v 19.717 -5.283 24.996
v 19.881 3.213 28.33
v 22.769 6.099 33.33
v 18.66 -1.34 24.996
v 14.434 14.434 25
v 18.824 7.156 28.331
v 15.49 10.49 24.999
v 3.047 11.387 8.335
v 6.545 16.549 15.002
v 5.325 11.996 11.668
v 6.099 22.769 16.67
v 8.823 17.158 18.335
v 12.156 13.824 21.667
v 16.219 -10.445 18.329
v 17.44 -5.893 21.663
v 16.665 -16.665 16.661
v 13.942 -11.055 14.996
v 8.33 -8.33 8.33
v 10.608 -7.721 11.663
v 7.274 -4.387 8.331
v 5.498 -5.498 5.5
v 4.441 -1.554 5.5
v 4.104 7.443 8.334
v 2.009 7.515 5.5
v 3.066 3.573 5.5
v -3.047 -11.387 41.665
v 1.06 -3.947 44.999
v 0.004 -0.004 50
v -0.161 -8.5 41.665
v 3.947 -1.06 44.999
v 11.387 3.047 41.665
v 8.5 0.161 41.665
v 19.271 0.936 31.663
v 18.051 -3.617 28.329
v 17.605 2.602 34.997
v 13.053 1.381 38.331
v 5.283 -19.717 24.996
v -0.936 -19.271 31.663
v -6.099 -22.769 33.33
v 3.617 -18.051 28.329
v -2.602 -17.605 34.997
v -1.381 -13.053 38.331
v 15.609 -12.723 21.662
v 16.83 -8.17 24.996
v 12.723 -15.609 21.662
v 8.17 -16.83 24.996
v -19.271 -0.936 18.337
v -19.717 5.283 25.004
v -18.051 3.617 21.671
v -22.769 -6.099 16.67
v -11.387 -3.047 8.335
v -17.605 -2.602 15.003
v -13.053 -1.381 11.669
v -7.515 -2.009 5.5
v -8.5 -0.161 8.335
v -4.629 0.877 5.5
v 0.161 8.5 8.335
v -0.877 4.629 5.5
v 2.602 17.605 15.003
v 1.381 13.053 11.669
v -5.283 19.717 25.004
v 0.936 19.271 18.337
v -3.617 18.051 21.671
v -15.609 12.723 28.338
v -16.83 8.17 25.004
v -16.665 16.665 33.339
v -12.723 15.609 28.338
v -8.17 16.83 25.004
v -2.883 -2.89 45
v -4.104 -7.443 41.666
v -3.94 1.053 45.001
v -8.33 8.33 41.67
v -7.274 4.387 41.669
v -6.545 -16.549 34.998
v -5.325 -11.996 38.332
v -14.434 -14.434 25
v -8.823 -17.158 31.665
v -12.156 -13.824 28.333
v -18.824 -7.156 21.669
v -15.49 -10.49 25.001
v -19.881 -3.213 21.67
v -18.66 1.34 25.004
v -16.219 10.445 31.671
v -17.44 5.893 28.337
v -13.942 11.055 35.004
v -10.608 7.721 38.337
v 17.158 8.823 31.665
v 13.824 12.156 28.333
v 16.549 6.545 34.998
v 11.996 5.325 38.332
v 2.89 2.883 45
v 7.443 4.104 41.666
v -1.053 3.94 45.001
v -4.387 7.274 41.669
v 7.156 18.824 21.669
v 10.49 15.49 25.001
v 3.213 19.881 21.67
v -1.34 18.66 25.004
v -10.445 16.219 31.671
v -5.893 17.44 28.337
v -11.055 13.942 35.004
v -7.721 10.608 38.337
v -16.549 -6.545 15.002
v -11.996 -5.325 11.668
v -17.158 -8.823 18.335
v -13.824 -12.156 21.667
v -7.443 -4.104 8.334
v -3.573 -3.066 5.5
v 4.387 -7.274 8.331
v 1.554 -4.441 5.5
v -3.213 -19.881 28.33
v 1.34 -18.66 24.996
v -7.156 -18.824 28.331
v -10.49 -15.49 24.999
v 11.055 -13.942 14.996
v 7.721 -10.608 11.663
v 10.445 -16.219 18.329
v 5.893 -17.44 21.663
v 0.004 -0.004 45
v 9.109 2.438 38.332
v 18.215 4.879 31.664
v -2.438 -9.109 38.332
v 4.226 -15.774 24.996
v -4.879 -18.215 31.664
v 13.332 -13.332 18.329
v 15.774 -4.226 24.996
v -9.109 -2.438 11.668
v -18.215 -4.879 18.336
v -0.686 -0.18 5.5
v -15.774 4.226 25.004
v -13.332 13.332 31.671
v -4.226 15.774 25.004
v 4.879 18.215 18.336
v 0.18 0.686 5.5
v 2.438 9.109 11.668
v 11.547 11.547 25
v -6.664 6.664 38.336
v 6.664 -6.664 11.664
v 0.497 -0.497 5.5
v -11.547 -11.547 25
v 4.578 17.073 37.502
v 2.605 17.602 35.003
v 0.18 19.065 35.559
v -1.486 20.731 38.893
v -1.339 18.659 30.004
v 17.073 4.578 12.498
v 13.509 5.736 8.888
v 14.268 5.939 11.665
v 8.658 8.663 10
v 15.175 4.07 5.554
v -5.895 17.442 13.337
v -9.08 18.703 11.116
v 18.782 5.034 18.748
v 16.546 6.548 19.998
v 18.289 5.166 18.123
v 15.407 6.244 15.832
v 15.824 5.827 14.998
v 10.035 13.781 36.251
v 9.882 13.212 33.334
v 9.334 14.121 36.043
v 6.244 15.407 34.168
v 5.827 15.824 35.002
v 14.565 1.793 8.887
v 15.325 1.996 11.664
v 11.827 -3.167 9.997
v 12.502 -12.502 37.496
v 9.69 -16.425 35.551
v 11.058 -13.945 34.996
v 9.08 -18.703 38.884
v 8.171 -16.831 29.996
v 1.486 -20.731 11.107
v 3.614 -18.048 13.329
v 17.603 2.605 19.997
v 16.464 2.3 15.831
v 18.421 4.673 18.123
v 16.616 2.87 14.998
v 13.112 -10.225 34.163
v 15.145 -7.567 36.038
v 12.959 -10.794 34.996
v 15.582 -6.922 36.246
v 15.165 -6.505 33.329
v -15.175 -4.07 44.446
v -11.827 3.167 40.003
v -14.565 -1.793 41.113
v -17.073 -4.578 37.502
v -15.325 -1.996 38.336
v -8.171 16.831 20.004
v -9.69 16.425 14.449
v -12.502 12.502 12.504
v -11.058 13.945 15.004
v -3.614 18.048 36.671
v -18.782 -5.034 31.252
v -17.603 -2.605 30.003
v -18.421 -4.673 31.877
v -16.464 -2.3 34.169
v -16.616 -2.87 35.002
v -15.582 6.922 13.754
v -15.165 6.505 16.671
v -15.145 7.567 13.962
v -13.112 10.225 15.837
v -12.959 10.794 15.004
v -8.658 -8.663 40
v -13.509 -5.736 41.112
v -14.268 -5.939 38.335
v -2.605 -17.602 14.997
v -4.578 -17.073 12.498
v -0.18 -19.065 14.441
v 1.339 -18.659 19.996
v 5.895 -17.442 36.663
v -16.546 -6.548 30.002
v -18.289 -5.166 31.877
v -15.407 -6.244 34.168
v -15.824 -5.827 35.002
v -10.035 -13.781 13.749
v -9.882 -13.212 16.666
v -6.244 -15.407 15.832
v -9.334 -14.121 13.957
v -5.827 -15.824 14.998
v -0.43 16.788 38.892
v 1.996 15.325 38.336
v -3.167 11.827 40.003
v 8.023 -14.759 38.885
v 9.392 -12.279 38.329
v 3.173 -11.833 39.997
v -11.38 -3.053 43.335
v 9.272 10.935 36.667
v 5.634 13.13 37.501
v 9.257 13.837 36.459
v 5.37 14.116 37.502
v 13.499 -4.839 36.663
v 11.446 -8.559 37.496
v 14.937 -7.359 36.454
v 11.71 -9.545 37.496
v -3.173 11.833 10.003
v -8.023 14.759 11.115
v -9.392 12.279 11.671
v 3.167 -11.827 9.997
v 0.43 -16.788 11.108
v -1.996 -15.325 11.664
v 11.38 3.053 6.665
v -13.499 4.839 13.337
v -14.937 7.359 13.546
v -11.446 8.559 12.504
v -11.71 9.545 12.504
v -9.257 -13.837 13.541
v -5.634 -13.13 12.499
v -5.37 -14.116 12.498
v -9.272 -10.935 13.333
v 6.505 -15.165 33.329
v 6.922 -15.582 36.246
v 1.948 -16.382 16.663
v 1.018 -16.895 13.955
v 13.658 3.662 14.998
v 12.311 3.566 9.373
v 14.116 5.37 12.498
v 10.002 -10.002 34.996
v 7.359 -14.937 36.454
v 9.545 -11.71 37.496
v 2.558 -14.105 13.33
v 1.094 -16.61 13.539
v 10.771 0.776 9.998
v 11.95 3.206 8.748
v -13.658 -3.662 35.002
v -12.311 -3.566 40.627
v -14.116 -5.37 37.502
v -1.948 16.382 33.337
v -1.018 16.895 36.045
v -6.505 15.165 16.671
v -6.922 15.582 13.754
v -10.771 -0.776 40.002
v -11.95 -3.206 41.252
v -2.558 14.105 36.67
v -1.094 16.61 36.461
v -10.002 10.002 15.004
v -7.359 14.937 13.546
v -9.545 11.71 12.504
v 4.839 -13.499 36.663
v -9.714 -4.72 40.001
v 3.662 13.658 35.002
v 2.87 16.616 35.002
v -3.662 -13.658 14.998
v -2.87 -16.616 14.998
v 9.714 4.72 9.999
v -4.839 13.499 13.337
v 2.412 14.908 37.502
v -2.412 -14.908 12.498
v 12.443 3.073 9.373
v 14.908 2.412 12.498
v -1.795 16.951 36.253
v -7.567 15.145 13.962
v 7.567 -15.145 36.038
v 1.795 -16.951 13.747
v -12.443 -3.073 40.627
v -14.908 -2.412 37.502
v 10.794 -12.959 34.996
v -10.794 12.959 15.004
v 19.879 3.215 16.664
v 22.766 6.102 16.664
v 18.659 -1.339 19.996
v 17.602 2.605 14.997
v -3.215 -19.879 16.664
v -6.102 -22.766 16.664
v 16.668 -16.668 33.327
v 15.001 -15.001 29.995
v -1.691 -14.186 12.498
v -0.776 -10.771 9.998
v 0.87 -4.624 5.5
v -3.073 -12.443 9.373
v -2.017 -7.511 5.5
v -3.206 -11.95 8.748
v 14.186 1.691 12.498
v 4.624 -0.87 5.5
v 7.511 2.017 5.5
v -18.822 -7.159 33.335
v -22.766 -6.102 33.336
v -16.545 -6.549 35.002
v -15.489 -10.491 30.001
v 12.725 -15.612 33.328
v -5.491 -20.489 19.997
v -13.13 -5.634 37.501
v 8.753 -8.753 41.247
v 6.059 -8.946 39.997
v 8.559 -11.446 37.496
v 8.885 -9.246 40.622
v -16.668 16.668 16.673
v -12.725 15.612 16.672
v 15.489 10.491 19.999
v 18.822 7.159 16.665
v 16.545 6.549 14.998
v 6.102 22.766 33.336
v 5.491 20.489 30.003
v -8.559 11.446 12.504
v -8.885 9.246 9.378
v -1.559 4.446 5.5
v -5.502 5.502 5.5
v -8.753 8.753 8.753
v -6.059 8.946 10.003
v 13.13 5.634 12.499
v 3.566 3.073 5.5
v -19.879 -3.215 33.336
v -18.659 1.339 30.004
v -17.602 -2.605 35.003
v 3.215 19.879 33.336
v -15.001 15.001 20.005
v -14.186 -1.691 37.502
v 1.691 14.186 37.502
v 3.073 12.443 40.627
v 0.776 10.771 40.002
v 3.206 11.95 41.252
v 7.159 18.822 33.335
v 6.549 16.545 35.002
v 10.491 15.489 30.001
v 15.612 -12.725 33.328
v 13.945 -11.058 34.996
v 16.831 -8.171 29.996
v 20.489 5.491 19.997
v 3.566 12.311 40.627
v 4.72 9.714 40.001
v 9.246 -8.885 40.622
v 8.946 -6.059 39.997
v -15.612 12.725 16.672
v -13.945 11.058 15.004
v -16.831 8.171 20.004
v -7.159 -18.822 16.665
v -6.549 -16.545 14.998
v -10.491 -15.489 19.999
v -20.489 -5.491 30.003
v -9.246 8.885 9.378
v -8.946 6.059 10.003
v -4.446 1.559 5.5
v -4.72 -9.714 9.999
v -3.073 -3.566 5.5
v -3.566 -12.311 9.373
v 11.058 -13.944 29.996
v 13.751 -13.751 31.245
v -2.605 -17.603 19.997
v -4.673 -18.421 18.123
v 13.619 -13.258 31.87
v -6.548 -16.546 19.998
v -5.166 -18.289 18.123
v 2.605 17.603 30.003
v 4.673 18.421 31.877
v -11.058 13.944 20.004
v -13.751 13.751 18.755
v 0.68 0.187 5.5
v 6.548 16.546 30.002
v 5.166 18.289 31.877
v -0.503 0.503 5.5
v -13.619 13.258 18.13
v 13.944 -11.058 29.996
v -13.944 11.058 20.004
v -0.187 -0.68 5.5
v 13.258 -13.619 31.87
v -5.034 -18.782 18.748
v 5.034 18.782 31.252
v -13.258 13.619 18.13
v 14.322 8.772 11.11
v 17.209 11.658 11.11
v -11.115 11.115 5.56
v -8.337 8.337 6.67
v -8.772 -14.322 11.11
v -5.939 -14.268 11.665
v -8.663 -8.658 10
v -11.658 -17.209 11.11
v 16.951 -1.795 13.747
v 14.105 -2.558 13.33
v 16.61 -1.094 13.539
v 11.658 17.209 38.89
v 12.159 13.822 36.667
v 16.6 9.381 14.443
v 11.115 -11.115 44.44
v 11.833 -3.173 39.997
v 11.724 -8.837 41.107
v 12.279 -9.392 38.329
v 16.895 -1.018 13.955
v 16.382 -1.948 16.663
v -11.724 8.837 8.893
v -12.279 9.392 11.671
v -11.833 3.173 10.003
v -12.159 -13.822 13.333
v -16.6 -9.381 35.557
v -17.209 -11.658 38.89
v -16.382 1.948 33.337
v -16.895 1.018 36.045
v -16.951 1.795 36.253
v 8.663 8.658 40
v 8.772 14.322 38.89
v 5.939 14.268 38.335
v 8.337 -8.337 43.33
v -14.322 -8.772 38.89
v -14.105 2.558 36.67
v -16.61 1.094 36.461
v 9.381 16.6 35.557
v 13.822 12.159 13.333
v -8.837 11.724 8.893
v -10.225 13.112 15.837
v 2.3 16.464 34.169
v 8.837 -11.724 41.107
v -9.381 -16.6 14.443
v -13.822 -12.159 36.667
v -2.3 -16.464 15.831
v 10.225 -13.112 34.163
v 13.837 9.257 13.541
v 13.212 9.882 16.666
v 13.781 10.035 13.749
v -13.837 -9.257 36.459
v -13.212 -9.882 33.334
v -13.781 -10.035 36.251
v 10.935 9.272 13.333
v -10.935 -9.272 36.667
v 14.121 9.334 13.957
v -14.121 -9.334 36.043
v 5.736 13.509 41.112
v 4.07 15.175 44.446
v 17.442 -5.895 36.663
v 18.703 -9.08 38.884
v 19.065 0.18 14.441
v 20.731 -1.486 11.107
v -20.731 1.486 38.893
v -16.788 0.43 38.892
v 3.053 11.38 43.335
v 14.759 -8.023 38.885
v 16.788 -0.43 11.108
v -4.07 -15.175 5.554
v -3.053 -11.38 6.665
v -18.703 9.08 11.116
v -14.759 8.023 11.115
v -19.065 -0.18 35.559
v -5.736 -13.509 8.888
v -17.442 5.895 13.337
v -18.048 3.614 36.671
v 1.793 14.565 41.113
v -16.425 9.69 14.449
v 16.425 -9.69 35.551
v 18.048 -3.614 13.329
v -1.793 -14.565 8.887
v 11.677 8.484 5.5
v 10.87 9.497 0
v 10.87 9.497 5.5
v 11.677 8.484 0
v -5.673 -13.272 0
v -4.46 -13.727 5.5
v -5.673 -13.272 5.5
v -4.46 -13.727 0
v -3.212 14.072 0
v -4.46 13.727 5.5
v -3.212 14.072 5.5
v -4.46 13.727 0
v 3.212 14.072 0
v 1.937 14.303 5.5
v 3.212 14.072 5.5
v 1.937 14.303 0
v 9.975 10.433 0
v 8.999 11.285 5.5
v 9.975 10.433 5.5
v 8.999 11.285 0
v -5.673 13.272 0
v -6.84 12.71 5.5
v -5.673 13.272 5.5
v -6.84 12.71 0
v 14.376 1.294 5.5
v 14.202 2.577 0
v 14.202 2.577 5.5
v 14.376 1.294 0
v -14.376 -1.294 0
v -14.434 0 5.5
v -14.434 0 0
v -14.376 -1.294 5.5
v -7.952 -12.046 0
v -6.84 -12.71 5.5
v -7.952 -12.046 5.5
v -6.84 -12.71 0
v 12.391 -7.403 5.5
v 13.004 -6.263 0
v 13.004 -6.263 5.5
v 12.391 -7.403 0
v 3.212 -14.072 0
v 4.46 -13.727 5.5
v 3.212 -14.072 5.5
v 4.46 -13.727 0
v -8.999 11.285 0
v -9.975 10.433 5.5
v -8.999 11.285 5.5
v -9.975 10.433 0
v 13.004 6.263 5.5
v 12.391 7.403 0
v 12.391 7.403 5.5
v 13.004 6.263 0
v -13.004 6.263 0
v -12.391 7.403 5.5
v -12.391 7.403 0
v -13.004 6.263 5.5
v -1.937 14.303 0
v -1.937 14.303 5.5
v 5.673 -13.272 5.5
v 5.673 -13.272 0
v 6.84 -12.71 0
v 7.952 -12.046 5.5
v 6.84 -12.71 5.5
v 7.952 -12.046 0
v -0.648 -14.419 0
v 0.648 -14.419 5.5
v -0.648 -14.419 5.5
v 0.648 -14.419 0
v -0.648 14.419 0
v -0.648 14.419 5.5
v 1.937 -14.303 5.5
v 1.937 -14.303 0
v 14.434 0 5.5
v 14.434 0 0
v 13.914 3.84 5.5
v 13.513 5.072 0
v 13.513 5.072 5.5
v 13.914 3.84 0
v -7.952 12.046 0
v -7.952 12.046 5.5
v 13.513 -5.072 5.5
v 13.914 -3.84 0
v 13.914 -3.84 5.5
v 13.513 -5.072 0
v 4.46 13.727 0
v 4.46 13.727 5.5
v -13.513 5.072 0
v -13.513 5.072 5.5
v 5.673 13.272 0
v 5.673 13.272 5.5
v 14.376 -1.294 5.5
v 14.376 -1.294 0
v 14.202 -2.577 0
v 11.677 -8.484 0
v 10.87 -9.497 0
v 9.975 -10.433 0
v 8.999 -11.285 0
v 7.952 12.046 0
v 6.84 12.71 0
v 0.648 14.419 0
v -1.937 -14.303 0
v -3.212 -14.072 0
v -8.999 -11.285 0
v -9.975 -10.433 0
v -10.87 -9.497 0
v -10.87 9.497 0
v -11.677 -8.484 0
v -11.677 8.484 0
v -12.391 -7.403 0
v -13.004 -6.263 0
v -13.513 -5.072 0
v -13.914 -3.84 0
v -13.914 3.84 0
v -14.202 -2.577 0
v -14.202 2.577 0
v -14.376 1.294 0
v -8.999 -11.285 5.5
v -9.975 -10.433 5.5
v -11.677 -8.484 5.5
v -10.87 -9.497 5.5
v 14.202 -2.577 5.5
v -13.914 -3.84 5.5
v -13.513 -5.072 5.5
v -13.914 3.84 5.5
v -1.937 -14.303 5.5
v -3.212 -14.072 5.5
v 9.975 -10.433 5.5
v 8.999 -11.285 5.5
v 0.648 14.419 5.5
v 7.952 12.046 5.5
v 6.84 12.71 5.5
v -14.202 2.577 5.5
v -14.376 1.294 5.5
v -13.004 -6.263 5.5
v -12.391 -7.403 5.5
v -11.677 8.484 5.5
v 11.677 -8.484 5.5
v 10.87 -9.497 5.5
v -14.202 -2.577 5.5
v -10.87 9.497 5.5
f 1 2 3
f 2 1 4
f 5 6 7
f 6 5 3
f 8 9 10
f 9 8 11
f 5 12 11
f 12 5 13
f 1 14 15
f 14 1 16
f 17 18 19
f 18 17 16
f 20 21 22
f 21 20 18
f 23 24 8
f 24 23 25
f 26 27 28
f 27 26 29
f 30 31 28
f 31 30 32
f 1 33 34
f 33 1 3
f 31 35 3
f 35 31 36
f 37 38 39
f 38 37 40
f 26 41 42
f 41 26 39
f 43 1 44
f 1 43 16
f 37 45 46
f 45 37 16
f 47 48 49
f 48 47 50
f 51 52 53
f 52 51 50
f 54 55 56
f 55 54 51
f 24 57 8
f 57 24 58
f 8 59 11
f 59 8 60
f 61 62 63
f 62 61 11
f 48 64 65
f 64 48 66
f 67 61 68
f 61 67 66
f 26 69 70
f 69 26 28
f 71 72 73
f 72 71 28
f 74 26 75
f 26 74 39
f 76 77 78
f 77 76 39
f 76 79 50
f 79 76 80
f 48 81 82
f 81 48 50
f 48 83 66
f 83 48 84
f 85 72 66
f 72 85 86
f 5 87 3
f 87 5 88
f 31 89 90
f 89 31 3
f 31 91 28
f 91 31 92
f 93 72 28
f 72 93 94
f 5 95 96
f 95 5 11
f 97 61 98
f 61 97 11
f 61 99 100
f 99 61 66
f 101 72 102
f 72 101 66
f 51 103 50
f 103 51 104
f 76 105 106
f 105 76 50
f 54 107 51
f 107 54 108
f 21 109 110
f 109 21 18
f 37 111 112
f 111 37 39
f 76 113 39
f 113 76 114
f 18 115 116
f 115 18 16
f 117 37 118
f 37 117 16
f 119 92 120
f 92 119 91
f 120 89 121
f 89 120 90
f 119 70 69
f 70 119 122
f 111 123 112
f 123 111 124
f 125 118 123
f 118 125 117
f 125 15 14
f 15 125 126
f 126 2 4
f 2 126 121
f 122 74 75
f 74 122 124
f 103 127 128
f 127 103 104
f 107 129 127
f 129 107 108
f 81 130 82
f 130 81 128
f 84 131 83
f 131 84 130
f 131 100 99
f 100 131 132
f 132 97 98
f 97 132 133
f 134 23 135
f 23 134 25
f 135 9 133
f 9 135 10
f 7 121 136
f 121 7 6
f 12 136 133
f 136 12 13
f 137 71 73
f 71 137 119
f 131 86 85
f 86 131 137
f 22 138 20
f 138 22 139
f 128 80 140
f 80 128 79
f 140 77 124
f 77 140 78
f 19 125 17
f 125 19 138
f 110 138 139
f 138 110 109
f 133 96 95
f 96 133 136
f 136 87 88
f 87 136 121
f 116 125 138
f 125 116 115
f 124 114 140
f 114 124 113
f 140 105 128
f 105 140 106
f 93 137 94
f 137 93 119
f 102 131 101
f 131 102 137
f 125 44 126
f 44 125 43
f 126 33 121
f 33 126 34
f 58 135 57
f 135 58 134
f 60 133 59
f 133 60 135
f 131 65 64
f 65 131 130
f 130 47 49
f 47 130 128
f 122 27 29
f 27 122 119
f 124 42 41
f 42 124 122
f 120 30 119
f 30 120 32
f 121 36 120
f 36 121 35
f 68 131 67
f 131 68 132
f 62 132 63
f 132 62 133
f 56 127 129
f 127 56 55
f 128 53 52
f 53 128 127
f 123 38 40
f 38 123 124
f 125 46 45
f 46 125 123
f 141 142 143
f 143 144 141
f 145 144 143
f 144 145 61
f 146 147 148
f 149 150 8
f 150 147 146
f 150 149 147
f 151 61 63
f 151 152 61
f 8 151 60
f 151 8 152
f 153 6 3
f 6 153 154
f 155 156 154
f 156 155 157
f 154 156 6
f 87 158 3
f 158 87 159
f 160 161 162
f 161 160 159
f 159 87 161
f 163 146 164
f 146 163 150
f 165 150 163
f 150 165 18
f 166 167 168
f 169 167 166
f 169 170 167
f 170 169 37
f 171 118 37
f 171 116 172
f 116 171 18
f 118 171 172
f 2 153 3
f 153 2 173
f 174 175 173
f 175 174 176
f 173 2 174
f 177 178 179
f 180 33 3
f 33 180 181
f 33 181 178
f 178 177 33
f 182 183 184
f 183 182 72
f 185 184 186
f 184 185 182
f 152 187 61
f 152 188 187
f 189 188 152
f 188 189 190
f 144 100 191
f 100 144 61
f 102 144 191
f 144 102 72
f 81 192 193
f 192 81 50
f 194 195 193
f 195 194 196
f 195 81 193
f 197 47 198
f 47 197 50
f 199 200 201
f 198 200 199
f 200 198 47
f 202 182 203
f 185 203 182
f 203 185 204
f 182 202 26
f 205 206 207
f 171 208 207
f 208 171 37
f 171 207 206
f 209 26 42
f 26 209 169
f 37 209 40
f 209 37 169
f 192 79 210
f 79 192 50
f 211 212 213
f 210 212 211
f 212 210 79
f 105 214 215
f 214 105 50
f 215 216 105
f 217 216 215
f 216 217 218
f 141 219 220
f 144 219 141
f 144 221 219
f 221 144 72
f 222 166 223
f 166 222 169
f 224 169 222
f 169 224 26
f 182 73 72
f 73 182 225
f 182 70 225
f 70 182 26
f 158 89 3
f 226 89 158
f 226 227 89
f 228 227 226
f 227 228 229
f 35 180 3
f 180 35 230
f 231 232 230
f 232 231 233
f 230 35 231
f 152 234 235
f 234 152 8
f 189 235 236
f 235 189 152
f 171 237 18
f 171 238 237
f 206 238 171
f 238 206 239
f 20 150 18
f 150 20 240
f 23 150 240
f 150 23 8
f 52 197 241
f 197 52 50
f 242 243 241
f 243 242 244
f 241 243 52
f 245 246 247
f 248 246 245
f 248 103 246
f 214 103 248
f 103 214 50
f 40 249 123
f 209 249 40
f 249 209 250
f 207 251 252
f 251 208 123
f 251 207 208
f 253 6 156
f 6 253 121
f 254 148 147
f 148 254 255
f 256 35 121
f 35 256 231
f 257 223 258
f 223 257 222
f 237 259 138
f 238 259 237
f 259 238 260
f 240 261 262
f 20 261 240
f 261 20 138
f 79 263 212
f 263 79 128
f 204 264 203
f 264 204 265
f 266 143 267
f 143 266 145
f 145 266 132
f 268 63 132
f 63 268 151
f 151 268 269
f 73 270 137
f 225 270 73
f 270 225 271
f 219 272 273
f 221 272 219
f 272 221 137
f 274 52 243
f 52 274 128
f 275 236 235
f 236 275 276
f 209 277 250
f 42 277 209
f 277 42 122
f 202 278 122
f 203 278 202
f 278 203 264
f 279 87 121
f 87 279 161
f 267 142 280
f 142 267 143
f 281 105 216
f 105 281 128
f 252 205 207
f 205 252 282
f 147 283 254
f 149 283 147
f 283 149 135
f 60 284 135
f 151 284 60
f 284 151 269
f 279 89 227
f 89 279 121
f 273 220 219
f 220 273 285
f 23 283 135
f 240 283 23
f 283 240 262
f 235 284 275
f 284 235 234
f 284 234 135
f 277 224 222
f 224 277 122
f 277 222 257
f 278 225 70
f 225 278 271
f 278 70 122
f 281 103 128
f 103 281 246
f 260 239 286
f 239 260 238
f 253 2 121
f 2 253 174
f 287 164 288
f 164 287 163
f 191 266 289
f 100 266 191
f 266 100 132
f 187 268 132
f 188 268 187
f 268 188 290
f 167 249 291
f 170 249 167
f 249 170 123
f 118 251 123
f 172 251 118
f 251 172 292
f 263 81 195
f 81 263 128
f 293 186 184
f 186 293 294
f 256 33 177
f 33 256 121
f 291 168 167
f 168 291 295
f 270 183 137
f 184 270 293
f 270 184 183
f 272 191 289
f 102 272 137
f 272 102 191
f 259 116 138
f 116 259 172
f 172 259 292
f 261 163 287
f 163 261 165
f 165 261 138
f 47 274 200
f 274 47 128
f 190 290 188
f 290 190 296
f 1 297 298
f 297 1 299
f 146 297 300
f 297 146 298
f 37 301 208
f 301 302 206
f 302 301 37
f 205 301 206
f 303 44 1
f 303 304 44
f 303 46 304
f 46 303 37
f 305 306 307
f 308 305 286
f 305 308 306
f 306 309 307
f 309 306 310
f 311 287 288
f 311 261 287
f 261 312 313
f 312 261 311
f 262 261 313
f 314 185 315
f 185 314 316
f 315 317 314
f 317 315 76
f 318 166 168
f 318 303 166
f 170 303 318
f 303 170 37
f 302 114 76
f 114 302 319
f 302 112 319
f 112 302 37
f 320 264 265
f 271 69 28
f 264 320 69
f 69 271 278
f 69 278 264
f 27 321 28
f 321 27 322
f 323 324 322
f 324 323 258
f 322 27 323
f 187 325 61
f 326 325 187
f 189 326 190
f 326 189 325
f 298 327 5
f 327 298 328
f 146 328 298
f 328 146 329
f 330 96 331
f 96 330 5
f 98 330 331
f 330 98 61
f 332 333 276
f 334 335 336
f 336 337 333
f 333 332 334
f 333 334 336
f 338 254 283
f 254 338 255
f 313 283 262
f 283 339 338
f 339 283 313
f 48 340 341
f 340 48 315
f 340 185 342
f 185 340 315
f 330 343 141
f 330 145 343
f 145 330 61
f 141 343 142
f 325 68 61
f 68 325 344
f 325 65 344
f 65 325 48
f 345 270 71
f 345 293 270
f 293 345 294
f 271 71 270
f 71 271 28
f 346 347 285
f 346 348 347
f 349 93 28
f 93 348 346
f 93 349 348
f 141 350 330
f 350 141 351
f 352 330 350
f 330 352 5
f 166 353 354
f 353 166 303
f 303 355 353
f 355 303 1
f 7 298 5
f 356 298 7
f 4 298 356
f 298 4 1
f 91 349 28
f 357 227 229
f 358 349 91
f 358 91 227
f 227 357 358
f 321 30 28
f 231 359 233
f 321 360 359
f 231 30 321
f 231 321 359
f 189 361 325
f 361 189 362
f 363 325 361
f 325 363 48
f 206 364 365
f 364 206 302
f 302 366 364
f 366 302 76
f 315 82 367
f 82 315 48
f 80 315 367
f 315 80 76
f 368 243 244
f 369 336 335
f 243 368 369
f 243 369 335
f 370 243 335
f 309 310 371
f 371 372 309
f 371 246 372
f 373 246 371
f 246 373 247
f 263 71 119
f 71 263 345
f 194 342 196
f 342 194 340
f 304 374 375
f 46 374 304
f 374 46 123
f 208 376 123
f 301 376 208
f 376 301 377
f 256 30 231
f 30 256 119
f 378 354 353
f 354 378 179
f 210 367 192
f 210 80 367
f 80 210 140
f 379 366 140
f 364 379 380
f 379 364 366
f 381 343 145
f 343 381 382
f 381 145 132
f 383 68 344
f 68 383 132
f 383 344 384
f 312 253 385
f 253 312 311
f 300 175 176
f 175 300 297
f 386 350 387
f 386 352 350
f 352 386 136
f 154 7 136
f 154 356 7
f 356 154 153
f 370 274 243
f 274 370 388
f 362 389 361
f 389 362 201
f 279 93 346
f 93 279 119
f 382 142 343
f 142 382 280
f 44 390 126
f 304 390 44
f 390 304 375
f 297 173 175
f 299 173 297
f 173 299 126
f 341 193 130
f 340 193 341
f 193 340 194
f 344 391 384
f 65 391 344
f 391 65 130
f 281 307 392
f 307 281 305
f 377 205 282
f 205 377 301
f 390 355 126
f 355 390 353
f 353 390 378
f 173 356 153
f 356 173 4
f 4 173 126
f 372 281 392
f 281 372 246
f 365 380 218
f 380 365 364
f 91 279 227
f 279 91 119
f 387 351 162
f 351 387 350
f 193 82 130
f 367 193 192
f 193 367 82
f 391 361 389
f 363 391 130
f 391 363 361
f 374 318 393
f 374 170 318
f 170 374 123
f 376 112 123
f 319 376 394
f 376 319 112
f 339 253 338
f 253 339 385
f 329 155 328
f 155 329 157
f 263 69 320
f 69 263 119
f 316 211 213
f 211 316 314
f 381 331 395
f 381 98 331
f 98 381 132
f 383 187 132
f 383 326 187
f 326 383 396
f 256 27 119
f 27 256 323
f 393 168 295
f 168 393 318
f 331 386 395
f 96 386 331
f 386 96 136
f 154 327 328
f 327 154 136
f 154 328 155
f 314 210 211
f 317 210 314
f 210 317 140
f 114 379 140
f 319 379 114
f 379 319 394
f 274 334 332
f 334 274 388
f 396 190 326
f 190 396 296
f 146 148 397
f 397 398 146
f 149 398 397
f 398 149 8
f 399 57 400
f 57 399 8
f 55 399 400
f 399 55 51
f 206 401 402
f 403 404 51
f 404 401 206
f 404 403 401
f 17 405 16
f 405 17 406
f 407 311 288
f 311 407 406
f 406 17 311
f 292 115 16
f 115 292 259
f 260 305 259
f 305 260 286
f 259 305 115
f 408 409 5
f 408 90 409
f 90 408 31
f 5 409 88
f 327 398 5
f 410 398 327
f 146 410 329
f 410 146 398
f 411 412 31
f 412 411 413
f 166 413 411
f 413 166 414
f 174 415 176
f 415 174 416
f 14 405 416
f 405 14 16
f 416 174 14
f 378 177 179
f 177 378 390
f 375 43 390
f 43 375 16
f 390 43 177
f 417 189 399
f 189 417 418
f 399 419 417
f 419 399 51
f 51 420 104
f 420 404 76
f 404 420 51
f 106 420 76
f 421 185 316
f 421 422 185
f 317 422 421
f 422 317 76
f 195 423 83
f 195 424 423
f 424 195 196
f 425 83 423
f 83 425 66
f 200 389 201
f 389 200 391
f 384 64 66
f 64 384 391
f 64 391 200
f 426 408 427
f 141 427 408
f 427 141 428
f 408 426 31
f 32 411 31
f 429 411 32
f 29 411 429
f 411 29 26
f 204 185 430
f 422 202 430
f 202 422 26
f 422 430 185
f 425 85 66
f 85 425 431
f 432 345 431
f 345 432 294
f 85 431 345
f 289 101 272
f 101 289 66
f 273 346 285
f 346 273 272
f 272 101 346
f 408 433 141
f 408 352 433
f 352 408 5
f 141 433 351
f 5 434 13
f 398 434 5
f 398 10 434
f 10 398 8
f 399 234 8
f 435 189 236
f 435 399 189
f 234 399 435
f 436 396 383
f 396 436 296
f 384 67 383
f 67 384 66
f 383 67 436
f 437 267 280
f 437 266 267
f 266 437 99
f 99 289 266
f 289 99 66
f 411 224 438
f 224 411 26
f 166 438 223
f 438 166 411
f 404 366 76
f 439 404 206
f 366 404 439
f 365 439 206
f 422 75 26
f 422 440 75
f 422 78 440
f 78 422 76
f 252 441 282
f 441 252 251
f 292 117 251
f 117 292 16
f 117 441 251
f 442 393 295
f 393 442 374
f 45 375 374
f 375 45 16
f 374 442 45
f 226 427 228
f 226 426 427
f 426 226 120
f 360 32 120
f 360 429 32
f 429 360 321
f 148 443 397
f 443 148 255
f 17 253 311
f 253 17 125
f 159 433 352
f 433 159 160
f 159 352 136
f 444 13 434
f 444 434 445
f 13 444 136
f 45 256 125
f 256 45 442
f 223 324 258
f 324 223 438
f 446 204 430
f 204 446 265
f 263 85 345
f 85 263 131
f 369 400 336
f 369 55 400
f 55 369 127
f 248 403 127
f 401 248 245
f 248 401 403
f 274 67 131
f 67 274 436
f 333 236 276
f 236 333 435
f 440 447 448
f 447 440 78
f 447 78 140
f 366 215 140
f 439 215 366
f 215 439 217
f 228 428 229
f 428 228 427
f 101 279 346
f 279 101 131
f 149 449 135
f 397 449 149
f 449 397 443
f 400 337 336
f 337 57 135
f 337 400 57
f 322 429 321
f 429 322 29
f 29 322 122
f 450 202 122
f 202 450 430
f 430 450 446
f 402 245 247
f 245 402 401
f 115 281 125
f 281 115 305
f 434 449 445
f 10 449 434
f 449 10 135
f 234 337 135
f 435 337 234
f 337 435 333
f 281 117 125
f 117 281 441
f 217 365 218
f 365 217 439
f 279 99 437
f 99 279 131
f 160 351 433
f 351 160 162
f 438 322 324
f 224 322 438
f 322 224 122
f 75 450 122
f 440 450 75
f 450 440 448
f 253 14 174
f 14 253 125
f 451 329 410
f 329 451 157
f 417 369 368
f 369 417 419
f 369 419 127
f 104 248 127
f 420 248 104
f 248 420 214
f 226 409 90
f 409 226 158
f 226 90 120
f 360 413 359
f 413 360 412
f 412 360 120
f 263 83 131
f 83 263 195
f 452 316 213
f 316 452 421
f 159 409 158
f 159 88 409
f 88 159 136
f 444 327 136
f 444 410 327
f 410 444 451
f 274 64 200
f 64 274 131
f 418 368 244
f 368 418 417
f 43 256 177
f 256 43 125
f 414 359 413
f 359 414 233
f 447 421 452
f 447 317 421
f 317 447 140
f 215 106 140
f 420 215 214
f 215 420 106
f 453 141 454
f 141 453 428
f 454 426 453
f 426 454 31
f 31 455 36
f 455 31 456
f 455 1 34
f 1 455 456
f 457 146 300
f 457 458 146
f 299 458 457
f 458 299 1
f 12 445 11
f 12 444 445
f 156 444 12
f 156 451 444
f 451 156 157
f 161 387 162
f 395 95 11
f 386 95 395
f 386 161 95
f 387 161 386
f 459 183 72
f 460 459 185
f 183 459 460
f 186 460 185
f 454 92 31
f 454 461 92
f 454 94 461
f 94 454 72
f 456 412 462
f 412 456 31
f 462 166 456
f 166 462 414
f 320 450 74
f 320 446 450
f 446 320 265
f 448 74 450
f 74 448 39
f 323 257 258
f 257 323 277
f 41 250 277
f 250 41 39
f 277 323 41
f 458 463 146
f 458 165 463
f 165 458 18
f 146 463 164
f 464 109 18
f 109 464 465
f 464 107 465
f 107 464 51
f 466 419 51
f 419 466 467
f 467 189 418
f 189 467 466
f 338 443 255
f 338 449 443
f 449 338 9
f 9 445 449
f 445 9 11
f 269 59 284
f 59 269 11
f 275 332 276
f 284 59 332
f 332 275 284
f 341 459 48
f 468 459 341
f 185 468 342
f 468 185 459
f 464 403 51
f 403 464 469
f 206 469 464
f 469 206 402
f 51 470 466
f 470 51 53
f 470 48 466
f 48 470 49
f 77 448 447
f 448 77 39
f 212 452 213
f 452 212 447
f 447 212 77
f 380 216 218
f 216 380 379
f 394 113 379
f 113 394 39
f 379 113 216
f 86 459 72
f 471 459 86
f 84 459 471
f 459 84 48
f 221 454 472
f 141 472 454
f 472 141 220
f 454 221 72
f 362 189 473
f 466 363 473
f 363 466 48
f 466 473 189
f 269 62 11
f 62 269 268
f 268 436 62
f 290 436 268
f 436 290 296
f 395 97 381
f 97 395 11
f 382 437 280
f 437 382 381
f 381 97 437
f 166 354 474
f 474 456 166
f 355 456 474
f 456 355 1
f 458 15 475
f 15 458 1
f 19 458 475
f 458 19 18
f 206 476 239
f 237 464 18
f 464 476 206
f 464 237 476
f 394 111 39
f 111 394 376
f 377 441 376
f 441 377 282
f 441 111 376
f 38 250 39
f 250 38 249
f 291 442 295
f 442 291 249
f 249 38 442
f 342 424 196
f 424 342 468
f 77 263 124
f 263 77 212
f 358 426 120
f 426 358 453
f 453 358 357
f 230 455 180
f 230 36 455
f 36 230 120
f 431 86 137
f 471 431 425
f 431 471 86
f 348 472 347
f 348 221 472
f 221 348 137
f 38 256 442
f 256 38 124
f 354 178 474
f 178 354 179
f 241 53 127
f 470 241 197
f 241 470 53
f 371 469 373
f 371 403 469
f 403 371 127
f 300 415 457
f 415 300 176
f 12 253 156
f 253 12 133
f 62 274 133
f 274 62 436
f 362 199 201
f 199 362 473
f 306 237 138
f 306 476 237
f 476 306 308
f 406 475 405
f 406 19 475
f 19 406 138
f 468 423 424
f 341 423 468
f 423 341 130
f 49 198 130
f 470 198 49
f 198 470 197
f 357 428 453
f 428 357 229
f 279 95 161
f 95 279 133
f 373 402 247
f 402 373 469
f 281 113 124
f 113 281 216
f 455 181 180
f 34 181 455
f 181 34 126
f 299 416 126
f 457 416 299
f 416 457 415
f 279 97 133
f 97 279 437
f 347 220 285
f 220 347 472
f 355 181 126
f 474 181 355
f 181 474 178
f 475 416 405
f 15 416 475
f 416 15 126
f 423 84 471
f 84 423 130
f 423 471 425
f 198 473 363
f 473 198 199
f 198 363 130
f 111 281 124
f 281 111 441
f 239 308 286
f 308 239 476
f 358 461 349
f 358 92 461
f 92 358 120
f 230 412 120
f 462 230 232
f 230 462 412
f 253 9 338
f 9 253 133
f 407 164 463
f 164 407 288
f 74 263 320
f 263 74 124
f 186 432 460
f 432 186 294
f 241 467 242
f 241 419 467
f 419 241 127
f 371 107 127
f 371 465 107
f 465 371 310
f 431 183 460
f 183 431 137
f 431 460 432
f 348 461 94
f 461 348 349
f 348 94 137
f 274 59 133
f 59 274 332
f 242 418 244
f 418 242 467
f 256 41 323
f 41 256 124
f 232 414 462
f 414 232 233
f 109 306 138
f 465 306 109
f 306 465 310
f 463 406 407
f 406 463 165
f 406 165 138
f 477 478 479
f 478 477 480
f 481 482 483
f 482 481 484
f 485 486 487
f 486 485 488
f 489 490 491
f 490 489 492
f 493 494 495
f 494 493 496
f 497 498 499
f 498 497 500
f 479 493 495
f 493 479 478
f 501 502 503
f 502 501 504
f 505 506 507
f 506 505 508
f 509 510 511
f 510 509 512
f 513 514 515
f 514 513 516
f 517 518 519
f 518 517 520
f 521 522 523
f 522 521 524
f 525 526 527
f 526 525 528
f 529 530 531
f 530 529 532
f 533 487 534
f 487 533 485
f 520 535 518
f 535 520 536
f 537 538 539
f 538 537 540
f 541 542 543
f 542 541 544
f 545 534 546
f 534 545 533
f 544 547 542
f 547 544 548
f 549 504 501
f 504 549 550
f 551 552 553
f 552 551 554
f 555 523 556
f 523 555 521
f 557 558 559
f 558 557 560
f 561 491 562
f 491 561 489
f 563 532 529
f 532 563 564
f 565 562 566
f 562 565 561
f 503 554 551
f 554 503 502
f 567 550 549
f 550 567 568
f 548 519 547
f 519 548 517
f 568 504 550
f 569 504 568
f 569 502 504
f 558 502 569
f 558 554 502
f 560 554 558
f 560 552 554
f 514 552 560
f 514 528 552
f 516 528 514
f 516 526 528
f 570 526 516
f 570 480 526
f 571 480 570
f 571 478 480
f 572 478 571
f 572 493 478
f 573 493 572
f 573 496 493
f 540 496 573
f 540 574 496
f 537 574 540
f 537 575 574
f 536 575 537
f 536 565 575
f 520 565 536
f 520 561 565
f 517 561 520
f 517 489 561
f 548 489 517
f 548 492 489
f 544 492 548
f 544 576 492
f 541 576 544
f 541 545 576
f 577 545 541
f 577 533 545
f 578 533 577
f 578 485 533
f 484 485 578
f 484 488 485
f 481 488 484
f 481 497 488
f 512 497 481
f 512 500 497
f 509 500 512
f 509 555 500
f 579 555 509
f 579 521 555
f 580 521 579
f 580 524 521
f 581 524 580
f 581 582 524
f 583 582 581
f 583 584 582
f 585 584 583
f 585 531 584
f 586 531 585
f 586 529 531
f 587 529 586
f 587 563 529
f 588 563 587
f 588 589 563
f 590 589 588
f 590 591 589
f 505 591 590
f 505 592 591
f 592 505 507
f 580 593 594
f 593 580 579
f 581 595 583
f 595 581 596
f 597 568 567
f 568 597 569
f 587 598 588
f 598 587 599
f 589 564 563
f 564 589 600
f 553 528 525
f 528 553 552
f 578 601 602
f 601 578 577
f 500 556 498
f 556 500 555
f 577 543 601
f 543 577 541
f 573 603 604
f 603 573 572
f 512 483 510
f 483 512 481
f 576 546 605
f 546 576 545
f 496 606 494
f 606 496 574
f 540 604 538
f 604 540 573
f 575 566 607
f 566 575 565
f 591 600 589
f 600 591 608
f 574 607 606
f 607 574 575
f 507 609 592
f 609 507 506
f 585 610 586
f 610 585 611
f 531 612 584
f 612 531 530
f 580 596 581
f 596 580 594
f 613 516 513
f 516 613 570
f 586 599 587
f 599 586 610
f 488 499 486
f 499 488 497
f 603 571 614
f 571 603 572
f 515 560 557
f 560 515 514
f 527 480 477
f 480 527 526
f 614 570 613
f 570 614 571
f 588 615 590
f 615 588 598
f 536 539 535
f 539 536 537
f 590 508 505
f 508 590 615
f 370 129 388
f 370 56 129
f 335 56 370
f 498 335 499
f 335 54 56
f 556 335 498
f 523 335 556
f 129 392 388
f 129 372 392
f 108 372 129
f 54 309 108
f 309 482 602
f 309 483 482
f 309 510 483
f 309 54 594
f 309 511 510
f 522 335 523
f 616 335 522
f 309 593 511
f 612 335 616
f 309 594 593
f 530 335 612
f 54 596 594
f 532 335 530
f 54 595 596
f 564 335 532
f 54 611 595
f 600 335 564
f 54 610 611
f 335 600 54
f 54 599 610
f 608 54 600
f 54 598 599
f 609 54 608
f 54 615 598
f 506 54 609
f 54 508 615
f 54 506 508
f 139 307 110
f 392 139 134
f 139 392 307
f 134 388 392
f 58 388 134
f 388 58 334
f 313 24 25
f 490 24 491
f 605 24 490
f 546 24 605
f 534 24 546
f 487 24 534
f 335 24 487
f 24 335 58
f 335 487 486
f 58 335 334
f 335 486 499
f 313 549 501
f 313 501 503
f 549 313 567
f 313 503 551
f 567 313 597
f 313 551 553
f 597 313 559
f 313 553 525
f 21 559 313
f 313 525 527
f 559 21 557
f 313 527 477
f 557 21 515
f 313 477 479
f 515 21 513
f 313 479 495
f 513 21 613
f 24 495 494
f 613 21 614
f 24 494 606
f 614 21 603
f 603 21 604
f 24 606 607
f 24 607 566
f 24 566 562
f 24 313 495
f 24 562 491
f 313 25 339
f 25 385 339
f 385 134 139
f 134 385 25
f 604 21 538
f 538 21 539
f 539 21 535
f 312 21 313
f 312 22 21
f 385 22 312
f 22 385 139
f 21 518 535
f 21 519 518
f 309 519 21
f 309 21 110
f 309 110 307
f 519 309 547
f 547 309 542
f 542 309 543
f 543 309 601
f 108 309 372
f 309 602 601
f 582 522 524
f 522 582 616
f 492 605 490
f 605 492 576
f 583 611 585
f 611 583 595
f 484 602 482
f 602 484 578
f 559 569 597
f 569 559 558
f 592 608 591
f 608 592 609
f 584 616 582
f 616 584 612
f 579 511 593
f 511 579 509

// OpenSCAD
module cube_skeleton(length, inner) 
{
 difference() {
  cube(length, true);
  cube(size = [length+0.01, inner, inner], center = true);
  cube(size = [inner, length+0.01, inner], center = true);
  cube(size = [inner, inner, length+0.01], center = true);
  }
}

height=50;
cubelen=height/sqrt(3);
cubein=cubelen*0.8;
translate([0,0,height/2]) union()
{
   translate(v = [0,0,-(height/2)]) cylinder(h=height*0.11, r=cubelen/2, $fn=70);

   rotate(109.5/2, [1,1,0])
	union()
	{
	    cube_skeleton(cubelen,cubein);
	    rotate(60, [1,1,1]) cube_skeleton(cubelen,cubein);
	    rotate(60, [1,-1,-1]) cube_skeleton(cubelen,cubein);
	    rotate(60, [-1,1,-1]) cube_skeleton(cubelen,cubein);
	    rotate(60, [-1,-1,1]) cube_skeleton(cubelen,cubein);
	}
}
